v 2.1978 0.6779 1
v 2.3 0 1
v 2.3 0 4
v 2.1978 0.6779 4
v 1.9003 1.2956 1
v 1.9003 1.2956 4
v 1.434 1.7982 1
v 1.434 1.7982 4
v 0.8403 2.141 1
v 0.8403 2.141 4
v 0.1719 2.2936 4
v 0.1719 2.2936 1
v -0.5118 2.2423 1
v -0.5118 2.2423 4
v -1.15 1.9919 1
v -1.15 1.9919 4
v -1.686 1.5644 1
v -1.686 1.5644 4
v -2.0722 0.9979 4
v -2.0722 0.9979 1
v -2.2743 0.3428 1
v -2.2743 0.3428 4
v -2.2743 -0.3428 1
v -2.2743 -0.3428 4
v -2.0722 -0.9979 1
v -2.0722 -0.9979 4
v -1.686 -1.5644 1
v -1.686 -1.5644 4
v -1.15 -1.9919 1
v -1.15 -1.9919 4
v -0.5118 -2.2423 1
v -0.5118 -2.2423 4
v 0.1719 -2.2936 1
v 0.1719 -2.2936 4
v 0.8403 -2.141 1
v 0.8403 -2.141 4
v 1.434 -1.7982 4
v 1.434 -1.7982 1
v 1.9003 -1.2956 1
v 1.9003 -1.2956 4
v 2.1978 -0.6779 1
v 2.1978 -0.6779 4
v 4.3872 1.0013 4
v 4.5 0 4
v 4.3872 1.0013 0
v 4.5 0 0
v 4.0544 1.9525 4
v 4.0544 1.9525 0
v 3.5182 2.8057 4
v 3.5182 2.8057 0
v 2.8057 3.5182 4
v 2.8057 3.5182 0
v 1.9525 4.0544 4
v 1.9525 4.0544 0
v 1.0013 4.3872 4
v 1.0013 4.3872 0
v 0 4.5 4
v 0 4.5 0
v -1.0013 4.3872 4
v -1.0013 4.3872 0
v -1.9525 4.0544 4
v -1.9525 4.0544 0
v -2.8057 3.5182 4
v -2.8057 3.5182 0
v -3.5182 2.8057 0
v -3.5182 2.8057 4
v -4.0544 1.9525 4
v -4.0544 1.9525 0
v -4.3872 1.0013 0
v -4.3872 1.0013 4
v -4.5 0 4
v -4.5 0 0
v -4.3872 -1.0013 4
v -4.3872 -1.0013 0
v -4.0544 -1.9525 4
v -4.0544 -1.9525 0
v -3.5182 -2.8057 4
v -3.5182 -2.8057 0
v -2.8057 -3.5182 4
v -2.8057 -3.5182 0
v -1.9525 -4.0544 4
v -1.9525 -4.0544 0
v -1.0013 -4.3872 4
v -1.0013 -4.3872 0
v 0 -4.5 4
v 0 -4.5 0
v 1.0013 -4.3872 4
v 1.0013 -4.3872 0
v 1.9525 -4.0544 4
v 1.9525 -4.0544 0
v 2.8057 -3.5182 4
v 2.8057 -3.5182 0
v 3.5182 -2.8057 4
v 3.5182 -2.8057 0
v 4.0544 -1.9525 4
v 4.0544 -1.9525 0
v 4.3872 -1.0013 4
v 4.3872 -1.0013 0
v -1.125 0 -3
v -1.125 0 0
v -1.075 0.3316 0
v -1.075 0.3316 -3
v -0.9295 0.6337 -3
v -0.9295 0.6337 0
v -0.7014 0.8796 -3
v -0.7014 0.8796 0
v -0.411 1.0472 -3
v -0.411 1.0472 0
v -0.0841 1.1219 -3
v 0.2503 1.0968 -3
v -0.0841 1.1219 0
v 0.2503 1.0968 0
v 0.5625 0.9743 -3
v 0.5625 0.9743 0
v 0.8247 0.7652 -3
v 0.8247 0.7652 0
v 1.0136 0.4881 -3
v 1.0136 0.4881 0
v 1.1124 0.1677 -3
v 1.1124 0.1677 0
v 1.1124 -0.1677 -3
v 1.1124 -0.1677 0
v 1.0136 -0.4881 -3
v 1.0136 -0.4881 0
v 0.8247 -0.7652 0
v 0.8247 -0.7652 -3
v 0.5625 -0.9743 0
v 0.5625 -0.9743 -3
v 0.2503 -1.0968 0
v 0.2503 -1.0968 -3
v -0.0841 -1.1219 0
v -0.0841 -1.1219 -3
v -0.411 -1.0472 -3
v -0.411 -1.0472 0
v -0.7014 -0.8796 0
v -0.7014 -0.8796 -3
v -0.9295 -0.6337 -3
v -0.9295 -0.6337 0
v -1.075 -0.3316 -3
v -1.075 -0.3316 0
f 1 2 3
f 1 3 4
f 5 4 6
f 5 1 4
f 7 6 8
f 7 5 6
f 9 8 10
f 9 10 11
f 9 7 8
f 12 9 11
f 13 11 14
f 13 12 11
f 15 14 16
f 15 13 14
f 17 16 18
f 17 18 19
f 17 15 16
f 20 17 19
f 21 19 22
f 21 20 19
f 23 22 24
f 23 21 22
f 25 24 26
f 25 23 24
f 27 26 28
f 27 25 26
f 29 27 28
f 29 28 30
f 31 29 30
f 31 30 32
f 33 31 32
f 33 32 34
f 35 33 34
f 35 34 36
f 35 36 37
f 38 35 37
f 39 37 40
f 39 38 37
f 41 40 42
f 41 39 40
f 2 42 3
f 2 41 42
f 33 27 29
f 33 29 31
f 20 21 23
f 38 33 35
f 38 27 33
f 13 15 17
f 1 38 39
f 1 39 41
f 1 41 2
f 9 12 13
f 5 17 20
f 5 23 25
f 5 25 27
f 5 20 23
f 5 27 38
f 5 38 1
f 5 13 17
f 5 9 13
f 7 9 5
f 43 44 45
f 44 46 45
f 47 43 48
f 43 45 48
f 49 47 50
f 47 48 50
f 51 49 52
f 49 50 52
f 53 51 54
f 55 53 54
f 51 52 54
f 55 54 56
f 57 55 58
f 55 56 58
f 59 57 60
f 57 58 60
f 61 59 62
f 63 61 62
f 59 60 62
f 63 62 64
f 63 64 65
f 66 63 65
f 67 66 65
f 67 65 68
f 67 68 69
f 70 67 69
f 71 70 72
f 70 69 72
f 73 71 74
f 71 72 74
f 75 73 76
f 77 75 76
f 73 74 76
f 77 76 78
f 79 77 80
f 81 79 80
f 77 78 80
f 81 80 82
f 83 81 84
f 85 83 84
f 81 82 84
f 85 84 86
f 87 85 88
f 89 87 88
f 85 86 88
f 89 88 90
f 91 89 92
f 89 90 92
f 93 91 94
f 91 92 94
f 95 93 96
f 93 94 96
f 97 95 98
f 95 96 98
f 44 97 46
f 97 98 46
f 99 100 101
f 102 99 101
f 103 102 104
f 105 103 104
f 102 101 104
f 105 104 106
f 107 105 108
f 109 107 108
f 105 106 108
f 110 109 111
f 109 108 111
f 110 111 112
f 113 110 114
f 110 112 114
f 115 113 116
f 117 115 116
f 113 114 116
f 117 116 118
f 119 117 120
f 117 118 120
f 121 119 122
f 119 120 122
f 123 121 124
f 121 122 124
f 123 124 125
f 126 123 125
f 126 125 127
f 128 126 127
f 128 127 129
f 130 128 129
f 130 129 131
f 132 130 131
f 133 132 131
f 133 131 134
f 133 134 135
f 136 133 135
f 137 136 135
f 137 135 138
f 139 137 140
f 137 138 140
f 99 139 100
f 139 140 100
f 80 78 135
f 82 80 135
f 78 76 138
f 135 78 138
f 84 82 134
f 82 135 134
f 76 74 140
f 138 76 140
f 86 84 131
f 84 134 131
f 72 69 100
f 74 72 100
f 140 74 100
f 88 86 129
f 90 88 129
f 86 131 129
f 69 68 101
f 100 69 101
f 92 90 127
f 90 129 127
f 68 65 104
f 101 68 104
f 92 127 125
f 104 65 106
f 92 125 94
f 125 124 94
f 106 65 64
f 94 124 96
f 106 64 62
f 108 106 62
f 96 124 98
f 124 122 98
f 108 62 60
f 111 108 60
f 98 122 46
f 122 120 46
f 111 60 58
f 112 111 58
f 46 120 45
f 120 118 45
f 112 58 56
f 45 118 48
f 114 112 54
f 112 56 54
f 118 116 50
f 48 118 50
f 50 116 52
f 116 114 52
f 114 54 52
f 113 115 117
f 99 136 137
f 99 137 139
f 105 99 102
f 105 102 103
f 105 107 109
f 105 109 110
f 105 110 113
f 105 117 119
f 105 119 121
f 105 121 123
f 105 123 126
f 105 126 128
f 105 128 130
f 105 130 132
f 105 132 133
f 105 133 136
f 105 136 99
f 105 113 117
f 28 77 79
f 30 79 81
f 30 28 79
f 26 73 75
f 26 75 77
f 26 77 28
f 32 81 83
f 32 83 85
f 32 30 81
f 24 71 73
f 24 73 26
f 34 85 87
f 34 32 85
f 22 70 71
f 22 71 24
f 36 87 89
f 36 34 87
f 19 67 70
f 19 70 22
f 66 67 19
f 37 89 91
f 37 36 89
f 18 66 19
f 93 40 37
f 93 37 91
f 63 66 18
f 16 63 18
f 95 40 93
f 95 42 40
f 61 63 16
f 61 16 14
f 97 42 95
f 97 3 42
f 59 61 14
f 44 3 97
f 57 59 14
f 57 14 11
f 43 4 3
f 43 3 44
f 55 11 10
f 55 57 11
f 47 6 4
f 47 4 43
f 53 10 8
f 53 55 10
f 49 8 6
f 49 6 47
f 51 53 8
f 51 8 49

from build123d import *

# Parameters (mm, degrees)
ESBO_O2_R                = 4.5
RESSALTO_EXTRUS_O1_DEPTH = 1
ESBO_O3_R                = 1.125
RESSALTO_EXTRUS_O2_DEPTH = 3
ESBO_O4_R                = 4.5
ESBO_O4_R_2              = 2.3
RESSALTO_EXTRUS_O3_DEPTH = 3


with BuildPart() as part:
    # Esboço2 → Ressalto-extrusão1 (new body)
    with BuildSketch(Plane.XY):
        Circle(ESBO_O2_R)
    extrude(amount=RESSALTO_EXTRUS_O1_DEPTH)

    # Esboço3 → Ressalto-extrusão2 (add)
    with BuildSketch(Plane(origin=(0, 0, 0), x_dir=(-1, 0, 0), z_dir=(0, 0, -1))):
        Circle(ESBO_O3_R)
    extrude(amount=RESSALTO_EXTRUS_O2_DEPTH)

    # Esboço4 → Ressalto-extrusão3 (add)
    with BuildSketch(Plane.XY.offset(1)):
        Circle(ESBO_O4_R)
        Circle(ESBO_O4_R_2, mode=Mode.SUBTRACT)
    extrude(amount=RESSALTO_EXTRUS_O3_DEPTH)


solid = part.part
